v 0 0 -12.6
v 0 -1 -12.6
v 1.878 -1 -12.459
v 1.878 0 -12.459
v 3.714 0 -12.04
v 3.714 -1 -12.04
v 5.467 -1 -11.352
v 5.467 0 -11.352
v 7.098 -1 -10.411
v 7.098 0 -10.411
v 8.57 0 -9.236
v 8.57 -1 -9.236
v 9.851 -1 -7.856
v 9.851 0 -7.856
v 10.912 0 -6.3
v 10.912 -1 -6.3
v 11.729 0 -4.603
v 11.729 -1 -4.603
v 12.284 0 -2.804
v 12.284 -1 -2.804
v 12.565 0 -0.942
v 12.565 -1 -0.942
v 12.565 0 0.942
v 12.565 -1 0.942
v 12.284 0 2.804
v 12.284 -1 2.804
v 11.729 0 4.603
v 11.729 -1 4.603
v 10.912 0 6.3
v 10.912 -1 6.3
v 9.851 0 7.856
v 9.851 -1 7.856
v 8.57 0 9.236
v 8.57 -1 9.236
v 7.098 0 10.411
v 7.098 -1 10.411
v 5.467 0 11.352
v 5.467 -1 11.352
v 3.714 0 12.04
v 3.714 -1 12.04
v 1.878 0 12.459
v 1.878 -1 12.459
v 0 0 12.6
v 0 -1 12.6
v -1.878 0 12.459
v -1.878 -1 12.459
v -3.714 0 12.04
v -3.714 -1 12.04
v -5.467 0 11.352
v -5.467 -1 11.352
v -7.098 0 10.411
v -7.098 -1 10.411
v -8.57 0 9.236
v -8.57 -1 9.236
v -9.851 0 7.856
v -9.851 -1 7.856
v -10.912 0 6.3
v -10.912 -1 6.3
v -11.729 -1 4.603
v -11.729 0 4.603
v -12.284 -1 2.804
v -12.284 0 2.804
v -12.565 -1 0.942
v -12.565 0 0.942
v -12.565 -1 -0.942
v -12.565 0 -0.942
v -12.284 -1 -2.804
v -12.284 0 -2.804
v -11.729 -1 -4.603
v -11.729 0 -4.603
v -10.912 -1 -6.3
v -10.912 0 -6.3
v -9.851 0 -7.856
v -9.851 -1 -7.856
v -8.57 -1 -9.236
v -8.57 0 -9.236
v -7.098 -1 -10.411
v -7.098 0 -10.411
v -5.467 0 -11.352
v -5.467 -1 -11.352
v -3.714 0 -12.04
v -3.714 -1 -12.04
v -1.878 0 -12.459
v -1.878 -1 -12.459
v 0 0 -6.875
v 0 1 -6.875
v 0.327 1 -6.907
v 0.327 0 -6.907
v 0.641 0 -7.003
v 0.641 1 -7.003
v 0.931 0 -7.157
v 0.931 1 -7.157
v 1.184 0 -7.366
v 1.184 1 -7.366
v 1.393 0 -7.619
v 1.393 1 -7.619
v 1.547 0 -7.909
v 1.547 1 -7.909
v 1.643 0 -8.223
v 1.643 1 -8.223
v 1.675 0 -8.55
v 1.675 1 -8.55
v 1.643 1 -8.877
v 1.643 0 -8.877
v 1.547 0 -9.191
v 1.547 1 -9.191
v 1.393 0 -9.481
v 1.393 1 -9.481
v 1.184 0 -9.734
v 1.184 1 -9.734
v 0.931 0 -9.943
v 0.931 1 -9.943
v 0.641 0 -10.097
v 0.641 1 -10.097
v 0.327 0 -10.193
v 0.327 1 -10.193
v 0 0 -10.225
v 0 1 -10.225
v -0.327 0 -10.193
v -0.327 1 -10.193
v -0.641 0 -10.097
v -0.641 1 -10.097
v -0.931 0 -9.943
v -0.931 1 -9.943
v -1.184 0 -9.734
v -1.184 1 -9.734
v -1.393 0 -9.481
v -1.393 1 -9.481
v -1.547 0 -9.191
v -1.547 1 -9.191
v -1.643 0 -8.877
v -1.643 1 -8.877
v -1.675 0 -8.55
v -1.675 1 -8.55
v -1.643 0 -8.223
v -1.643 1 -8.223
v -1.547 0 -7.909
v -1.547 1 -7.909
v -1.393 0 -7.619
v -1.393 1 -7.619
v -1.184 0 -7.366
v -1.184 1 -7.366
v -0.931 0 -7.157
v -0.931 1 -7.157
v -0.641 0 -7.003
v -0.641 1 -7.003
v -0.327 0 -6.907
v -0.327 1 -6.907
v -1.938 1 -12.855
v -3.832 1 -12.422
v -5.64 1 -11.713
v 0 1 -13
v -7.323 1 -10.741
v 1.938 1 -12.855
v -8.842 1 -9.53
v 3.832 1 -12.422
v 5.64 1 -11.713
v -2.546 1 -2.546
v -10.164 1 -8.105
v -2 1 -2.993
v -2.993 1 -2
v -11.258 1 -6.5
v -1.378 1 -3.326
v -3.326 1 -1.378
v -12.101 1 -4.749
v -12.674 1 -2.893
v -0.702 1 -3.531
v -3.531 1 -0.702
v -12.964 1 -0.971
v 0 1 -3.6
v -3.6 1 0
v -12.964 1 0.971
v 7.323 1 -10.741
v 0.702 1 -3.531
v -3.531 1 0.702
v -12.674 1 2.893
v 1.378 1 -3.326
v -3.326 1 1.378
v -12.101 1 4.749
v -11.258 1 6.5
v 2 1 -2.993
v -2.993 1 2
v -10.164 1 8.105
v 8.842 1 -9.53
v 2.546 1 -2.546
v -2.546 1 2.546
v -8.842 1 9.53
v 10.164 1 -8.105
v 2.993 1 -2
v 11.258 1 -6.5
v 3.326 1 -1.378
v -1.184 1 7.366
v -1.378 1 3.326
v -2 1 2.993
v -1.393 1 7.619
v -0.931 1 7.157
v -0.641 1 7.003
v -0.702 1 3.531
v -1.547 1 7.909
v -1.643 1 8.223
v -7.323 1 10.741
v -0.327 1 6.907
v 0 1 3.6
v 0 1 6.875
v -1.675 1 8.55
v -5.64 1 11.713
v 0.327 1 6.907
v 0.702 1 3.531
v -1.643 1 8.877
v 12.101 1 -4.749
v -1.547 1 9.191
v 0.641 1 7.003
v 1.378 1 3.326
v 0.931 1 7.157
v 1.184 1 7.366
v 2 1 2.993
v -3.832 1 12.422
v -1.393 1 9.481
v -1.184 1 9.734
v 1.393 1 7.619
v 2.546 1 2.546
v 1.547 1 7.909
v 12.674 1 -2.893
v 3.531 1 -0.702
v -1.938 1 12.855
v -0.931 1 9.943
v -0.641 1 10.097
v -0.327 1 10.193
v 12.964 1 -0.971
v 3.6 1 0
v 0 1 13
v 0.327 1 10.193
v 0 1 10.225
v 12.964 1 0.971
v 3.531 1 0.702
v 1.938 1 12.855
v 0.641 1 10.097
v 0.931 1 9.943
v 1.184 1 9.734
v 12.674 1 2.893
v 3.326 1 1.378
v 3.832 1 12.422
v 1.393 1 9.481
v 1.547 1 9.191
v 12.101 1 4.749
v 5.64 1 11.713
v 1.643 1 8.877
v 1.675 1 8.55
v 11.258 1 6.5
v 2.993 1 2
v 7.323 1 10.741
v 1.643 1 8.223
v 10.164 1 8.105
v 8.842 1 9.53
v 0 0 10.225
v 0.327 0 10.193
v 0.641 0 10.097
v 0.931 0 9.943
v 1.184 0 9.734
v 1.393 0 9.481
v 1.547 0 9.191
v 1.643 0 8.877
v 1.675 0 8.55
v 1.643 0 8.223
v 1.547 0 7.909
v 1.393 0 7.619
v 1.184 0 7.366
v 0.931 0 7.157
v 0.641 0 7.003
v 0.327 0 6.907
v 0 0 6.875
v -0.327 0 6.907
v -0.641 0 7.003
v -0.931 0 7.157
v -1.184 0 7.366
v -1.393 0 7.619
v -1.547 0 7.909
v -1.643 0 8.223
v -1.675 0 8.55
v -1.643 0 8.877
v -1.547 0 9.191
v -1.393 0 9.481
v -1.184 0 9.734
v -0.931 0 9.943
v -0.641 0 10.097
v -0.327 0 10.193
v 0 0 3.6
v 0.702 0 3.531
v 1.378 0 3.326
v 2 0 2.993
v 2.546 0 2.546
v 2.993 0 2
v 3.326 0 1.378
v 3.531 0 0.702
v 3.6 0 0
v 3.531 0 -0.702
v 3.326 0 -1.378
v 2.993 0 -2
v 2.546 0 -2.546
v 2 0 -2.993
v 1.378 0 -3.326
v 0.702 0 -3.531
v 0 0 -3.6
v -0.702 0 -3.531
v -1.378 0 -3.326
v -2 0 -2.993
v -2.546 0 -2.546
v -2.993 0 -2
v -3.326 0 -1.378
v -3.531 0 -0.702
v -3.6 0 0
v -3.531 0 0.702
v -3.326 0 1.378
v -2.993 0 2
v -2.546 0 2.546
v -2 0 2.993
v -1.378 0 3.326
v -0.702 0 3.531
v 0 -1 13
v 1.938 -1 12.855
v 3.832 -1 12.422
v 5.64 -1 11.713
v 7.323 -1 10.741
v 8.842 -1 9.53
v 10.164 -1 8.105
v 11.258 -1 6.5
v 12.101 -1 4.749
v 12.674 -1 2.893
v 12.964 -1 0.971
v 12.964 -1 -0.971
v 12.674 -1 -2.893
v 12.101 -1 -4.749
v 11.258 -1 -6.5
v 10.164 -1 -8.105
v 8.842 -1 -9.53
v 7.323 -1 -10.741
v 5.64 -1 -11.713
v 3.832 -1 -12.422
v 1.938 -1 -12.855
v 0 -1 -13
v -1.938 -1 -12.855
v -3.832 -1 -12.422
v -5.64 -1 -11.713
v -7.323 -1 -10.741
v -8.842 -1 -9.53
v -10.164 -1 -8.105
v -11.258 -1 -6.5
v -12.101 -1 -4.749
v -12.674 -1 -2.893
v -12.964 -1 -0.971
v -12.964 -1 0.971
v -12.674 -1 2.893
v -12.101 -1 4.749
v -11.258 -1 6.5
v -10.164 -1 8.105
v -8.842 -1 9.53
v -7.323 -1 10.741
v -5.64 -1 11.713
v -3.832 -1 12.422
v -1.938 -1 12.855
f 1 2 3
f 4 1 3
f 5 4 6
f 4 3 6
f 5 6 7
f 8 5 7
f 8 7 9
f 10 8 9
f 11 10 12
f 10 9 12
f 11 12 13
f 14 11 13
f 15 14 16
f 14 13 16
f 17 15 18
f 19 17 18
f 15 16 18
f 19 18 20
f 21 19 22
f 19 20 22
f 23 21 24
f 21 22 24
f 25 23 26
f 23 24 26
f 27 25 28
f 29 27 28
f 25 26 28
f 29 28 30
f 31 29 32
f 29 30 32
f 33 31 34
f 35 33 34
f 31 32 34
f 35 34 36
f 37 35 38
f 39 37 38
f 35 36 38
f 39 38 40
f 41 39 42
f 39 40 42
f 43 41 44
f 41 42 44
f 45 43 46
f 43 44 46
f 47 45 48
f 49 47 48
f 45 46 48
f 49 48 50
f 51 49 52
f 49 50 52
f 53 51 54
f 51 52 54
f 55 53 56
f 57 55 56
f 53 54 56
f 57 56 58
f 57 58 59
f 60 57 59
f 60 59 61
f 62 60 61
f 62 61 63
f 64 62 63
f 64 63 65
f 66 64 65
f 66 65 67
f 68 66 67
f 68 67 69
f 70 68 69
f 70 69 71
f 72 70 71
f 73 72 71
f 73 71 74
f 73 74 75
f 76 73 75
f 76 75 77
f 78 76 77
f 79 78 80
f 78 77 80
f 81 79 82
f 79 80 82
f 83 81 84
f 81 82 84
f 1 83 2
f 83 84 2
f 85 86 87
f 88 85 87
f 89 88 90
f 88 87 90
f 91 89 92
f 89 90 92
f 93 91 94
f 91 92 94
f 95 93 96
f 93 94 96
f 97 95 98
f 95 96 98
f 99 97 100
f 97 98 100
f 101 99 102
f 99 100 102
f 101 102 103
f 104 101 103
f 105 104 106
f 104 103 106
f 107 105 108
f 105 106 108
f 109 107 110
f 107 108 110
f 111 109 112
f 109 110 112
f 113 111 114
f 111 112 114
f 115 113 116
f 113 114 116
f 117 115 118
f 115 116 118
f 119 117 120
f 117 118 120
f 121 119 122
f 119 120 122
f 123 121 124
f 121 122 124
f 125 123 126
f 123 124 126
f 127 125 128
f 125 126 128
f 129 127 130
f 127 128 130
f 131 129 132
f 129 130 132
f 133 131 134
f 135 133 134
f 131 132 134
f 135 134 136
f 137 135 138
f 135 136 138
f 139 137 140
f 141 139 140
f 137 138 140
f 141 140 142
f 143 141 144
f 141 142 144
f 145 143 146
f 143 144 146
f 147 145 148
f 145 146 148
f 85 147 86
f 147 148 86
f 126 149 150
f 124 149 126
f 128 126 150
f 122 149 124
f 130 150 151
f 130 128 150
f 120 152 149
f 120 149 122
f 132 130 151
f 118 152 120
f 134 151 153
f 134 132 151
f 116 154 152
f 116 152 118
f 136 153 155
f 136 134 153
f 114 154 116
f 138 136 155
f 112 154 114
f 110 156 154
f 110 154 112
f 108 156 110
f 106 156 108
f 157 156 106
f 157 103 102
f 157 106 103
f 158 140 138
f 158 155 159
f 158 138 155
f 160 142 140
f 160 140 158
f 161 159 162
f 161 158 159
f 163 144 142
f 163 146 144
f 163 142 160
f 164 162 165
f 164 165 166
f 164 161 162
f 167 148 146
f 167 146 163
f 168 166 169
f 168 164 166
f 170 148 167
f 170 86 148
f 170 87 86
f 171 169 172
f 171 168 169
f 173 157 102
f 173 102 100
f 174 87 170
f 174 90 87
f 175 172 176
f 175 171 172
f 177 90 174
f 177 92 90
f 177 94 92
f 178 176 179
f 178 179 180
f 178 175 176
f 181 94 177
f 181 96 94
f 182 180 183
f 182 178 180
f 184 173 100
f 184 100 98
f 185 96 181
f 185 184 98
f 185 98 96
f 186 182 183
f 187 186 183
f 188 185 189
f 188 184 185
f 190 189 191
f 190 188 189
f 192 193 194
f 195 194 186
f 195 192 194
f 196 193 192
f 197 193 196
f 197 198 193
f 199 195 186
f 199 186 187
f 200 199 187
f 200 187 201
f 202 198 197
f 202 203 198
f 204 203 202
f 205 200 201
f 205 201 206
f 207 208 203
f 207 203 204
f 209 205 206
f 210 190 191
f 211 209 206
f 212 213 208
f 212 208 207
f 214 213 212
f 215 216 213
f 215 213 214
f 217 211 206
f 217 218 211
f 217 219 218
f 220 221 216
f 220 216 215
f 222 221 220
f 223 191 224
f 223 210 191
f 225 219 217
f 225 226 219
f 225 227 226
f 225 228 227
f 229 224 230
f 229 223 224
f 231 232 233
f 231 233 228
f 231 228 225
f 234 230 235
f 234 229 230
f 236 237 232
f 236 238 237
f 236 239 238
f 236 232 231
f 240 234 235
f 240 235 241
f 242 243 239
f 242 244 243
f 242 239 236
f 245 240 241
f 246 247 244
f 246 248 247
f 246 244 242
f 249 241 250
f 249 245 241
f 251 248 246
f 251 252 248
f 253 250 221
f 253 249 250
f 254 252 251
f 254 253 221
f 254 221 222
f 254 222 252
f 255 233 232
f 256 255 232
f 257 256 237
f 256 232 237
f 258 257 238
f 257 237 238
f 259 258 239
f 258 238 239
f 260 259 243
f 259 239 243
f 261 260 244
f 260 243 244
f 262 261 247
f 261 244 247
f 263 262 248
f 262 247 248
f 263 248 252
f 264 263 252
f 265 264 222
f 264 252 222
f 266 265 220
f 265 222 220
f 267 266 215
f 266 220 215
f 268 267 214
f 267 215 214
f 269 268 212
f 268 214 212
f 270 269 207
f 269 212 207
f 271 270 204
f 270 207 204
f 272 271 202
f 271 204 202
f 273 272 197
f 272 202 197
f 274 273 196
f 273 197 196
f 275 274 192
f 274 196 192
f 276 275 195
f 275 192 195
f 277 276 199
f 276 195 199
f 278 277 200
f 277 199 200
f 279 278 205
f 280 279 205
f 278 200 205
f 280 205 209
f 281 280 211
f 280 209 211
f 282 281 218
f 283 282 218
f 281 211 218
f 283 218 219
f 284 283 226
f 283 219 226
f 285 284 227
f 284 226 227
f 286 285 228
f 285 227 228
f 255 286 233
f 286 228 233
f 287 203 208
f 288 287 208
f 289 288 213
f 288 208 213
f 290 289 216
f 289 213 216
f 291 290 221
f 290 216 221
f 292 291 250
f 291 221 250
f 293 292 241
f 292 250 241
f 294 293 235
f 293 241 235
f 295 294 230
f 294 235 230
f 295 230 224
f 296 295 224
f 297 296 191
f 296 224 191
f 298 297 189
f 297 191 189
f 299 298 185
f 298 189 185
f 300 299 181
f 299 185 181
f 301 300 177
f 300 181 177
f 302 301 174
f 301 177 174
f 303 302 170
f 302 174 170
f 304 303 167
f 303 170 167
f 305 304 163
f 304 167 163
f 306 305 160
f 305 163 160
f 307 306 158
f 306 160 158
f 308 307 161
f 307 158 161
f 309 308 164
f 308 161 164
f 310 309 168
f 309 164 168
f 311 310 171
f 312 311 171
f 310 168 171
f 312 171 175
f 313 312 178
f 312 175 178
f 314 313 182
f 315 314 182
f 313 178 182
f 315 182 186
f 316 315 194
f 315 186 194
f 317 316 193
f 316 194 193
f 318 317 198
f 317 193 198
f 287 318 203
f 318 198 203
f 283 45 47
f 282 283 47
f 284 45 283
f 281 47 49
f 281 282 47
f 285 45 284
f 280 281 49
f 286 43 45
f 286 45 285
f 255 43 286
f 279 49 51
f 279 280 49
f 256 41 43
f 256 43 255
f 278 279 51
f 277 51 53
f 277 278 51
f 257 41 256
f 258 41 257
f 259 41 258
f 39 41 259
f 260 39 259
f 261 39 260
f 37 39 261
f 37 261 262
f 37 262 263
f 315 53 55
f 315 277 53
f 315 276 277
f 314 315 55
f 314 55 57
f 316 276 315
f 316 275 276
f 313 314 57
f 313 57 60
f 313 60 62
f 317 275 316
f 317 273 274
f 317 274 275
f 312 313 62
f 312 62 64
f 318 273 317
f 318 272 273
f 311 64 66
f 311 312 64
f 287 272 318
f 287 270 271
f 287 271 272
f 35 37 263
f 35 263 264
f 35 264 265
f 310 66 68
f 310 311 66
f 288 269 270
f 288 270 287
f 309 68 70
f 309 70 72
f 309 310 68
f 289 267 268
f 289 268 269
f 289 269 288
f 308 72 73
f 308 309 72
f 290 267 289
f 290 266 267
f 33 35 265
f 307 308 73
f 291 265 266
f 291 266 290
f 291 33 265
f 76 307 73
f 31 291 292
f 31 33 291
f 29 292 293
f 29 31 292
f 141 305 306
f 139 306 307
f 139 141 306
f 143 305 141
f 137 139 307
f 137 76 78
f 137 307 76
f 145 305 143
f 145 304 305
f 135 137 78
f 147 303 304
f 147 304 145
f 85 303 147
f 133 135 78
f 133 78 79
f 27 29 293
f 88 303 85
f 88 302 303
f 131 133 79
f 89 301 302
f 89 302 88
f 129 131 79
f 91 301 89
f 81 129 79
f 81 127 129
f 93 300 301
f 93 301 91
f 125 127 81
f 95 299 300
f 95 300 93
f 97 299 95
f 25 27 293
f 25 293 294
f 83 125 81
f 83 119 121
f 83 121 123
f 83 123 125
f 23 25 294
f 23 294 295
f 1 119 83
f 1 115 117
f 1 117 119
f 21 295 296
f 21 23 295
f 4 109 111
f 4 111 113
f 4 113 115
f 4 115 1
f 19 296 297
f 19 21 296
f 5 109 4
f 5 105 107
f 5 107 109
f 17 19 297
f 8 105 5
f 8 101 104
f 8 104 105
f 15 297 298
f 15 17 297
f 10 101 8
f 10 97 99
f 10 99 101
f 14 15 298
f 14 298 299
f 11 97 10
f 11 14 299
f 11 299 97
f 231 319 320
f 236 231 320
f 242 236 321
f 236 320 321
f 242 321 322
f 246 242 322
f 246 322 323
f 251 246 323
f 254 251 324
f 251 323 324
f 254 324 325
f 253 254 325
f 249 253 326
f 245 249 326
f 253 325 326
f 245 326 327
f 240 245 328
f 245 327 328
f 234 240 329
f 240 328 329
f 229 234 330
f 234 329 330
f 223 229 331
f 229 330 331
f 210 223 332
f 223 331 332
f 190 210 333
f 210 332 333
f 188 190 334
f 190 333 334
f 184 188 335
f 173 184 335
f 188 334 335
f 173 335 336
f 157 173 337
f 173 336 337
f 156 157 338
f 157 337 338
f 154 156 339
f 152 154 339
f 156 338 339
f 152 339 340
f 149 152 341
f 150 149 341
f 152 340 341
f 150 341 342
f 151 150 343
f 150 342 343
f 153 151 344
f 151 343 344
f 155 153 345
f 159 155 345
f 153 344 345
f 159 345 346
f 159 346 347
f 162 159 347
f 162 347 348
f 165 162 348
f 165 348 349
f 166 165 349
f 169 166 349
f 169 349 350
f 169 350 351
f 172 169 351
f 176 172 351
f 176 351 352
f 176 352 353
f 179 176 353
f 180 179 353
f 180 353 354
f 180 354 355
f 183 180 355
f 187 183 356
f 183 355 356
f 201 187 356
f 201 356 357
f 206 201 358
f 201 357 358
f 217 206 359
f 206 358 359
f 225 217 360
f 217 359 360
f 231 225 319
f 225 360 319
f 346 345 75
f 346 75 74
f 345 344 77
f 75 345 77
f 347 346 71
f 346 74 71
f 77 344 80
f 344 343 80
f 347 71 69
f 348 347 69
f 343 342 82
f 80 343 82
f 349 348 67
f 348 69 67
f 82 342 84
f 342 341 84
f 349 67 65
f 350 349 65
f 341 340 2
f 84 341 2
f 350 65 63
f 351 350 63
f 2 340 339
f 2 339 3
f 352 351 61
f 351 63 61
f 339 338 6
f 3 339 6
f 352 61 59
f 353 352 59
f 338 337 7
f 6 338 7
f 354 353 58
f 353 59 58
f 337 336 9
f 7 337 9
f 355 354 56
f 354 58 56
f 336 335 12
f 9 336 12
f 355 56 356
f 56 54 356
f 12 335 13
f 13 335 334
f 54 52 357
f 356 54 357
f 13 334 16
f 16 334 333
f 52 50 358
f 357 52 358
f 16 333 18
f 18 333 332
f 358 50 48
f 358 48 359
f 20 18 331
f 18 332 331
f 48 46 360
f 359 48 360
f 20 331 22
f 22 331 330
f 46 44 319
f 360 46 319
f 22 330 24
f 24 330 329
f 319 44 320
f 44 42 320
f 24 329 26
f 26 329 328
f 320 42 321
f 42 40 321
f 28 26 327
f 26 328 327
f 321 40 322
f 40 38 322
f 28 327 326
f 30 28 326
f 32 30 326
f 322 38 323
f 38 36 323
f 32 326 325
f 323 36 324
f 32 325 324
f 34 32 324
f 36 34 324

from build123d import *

# Parameters (mm, degrees)
SKETCH1_R           = 12.5
BOSS_EXTRUDE1_DEPTH = 1
SKETCH2_R           = 1.675
SKETCH2_R_2         = 3.6
CUT_EXTRUDE1_DEPTH  = 1
BOSS_EXTRUDE3_START = -2
SKETCH3_R           = 13
SKETCH3_R_2         = 12.5
BOSS_EXTRUDE3_DEPTH = 2
SKETCH5_R           = 12.6
CUT_EXTRUDE2_DEPTH  = 1


with BuildPart() as part:
    # Sketch1 → Boss-Extrude1 (new body)
    with BuildSketch(Plane(origin=(0, 0, 0), x_dir=(1, 0, 0), z_dir=(0, 1, 0))):
        with Locations(Location((0, 0, 0), (0, 0, 270))):
            Circle(SKETCH1_R)
    extrude(amount=BOSS_EXTRUDE1_DEPTH)

    # Sketch2 → Cut-Extrude1 (cut)
    with BuildSketch(Plane(origin=(0, 1, 0), x_dir=(1, 0, 0), z_dir=(0, 1, 0))):
        with Locations(Location((0, 8.55, 0), (0, 0, 270))):
            Circle(SKETCH2_R)
        with Locations(Location((0, -8.55, 0), (0, 0, 270))):
            Circle(SKETCH2_R)
        with Locations(Location((0, 0, 0), (0, 0, 270))):
            Circle(SKETCH2_R_2)
    extrude(amount=-CUT_EXTRUDE1_DEPTH, mode=Mode.SUBTRACT)

    # Sketch3 → Boss-Extrude3 (add)
    with BuildSketch(Plane(origin=(0, 1, 0), x_dir=(1, 0, 0), z_dir=(0, 1, 0)).offset(BOSS_EXTRUDE3_START)):
        with Locations(Location((0, 0, 0), (0, 0, 270))):
            Circle(SKETCH3_R)
        with Locations(Location((0, 0, 0), (0, 0, 270))):
            Circle(SKETCH3_R_2, mode=Mode.SUBTRACT)
    extrude(amount=BOSS_EXTRUDE3_DEPTH)

    # Sketch5 → Cut-Extrude2 (cut)
    with BuildSketch(Plane.XZ.offset(1)):
        with Locations(Location((0, 0, 0), (0, 0, 270))):
            Circle(SKETCH5_R)
    extrude(amount=-CUT_EXTRUDE2_DEPTH, mode=Mode.SUBTRACT)


solid = part.part
